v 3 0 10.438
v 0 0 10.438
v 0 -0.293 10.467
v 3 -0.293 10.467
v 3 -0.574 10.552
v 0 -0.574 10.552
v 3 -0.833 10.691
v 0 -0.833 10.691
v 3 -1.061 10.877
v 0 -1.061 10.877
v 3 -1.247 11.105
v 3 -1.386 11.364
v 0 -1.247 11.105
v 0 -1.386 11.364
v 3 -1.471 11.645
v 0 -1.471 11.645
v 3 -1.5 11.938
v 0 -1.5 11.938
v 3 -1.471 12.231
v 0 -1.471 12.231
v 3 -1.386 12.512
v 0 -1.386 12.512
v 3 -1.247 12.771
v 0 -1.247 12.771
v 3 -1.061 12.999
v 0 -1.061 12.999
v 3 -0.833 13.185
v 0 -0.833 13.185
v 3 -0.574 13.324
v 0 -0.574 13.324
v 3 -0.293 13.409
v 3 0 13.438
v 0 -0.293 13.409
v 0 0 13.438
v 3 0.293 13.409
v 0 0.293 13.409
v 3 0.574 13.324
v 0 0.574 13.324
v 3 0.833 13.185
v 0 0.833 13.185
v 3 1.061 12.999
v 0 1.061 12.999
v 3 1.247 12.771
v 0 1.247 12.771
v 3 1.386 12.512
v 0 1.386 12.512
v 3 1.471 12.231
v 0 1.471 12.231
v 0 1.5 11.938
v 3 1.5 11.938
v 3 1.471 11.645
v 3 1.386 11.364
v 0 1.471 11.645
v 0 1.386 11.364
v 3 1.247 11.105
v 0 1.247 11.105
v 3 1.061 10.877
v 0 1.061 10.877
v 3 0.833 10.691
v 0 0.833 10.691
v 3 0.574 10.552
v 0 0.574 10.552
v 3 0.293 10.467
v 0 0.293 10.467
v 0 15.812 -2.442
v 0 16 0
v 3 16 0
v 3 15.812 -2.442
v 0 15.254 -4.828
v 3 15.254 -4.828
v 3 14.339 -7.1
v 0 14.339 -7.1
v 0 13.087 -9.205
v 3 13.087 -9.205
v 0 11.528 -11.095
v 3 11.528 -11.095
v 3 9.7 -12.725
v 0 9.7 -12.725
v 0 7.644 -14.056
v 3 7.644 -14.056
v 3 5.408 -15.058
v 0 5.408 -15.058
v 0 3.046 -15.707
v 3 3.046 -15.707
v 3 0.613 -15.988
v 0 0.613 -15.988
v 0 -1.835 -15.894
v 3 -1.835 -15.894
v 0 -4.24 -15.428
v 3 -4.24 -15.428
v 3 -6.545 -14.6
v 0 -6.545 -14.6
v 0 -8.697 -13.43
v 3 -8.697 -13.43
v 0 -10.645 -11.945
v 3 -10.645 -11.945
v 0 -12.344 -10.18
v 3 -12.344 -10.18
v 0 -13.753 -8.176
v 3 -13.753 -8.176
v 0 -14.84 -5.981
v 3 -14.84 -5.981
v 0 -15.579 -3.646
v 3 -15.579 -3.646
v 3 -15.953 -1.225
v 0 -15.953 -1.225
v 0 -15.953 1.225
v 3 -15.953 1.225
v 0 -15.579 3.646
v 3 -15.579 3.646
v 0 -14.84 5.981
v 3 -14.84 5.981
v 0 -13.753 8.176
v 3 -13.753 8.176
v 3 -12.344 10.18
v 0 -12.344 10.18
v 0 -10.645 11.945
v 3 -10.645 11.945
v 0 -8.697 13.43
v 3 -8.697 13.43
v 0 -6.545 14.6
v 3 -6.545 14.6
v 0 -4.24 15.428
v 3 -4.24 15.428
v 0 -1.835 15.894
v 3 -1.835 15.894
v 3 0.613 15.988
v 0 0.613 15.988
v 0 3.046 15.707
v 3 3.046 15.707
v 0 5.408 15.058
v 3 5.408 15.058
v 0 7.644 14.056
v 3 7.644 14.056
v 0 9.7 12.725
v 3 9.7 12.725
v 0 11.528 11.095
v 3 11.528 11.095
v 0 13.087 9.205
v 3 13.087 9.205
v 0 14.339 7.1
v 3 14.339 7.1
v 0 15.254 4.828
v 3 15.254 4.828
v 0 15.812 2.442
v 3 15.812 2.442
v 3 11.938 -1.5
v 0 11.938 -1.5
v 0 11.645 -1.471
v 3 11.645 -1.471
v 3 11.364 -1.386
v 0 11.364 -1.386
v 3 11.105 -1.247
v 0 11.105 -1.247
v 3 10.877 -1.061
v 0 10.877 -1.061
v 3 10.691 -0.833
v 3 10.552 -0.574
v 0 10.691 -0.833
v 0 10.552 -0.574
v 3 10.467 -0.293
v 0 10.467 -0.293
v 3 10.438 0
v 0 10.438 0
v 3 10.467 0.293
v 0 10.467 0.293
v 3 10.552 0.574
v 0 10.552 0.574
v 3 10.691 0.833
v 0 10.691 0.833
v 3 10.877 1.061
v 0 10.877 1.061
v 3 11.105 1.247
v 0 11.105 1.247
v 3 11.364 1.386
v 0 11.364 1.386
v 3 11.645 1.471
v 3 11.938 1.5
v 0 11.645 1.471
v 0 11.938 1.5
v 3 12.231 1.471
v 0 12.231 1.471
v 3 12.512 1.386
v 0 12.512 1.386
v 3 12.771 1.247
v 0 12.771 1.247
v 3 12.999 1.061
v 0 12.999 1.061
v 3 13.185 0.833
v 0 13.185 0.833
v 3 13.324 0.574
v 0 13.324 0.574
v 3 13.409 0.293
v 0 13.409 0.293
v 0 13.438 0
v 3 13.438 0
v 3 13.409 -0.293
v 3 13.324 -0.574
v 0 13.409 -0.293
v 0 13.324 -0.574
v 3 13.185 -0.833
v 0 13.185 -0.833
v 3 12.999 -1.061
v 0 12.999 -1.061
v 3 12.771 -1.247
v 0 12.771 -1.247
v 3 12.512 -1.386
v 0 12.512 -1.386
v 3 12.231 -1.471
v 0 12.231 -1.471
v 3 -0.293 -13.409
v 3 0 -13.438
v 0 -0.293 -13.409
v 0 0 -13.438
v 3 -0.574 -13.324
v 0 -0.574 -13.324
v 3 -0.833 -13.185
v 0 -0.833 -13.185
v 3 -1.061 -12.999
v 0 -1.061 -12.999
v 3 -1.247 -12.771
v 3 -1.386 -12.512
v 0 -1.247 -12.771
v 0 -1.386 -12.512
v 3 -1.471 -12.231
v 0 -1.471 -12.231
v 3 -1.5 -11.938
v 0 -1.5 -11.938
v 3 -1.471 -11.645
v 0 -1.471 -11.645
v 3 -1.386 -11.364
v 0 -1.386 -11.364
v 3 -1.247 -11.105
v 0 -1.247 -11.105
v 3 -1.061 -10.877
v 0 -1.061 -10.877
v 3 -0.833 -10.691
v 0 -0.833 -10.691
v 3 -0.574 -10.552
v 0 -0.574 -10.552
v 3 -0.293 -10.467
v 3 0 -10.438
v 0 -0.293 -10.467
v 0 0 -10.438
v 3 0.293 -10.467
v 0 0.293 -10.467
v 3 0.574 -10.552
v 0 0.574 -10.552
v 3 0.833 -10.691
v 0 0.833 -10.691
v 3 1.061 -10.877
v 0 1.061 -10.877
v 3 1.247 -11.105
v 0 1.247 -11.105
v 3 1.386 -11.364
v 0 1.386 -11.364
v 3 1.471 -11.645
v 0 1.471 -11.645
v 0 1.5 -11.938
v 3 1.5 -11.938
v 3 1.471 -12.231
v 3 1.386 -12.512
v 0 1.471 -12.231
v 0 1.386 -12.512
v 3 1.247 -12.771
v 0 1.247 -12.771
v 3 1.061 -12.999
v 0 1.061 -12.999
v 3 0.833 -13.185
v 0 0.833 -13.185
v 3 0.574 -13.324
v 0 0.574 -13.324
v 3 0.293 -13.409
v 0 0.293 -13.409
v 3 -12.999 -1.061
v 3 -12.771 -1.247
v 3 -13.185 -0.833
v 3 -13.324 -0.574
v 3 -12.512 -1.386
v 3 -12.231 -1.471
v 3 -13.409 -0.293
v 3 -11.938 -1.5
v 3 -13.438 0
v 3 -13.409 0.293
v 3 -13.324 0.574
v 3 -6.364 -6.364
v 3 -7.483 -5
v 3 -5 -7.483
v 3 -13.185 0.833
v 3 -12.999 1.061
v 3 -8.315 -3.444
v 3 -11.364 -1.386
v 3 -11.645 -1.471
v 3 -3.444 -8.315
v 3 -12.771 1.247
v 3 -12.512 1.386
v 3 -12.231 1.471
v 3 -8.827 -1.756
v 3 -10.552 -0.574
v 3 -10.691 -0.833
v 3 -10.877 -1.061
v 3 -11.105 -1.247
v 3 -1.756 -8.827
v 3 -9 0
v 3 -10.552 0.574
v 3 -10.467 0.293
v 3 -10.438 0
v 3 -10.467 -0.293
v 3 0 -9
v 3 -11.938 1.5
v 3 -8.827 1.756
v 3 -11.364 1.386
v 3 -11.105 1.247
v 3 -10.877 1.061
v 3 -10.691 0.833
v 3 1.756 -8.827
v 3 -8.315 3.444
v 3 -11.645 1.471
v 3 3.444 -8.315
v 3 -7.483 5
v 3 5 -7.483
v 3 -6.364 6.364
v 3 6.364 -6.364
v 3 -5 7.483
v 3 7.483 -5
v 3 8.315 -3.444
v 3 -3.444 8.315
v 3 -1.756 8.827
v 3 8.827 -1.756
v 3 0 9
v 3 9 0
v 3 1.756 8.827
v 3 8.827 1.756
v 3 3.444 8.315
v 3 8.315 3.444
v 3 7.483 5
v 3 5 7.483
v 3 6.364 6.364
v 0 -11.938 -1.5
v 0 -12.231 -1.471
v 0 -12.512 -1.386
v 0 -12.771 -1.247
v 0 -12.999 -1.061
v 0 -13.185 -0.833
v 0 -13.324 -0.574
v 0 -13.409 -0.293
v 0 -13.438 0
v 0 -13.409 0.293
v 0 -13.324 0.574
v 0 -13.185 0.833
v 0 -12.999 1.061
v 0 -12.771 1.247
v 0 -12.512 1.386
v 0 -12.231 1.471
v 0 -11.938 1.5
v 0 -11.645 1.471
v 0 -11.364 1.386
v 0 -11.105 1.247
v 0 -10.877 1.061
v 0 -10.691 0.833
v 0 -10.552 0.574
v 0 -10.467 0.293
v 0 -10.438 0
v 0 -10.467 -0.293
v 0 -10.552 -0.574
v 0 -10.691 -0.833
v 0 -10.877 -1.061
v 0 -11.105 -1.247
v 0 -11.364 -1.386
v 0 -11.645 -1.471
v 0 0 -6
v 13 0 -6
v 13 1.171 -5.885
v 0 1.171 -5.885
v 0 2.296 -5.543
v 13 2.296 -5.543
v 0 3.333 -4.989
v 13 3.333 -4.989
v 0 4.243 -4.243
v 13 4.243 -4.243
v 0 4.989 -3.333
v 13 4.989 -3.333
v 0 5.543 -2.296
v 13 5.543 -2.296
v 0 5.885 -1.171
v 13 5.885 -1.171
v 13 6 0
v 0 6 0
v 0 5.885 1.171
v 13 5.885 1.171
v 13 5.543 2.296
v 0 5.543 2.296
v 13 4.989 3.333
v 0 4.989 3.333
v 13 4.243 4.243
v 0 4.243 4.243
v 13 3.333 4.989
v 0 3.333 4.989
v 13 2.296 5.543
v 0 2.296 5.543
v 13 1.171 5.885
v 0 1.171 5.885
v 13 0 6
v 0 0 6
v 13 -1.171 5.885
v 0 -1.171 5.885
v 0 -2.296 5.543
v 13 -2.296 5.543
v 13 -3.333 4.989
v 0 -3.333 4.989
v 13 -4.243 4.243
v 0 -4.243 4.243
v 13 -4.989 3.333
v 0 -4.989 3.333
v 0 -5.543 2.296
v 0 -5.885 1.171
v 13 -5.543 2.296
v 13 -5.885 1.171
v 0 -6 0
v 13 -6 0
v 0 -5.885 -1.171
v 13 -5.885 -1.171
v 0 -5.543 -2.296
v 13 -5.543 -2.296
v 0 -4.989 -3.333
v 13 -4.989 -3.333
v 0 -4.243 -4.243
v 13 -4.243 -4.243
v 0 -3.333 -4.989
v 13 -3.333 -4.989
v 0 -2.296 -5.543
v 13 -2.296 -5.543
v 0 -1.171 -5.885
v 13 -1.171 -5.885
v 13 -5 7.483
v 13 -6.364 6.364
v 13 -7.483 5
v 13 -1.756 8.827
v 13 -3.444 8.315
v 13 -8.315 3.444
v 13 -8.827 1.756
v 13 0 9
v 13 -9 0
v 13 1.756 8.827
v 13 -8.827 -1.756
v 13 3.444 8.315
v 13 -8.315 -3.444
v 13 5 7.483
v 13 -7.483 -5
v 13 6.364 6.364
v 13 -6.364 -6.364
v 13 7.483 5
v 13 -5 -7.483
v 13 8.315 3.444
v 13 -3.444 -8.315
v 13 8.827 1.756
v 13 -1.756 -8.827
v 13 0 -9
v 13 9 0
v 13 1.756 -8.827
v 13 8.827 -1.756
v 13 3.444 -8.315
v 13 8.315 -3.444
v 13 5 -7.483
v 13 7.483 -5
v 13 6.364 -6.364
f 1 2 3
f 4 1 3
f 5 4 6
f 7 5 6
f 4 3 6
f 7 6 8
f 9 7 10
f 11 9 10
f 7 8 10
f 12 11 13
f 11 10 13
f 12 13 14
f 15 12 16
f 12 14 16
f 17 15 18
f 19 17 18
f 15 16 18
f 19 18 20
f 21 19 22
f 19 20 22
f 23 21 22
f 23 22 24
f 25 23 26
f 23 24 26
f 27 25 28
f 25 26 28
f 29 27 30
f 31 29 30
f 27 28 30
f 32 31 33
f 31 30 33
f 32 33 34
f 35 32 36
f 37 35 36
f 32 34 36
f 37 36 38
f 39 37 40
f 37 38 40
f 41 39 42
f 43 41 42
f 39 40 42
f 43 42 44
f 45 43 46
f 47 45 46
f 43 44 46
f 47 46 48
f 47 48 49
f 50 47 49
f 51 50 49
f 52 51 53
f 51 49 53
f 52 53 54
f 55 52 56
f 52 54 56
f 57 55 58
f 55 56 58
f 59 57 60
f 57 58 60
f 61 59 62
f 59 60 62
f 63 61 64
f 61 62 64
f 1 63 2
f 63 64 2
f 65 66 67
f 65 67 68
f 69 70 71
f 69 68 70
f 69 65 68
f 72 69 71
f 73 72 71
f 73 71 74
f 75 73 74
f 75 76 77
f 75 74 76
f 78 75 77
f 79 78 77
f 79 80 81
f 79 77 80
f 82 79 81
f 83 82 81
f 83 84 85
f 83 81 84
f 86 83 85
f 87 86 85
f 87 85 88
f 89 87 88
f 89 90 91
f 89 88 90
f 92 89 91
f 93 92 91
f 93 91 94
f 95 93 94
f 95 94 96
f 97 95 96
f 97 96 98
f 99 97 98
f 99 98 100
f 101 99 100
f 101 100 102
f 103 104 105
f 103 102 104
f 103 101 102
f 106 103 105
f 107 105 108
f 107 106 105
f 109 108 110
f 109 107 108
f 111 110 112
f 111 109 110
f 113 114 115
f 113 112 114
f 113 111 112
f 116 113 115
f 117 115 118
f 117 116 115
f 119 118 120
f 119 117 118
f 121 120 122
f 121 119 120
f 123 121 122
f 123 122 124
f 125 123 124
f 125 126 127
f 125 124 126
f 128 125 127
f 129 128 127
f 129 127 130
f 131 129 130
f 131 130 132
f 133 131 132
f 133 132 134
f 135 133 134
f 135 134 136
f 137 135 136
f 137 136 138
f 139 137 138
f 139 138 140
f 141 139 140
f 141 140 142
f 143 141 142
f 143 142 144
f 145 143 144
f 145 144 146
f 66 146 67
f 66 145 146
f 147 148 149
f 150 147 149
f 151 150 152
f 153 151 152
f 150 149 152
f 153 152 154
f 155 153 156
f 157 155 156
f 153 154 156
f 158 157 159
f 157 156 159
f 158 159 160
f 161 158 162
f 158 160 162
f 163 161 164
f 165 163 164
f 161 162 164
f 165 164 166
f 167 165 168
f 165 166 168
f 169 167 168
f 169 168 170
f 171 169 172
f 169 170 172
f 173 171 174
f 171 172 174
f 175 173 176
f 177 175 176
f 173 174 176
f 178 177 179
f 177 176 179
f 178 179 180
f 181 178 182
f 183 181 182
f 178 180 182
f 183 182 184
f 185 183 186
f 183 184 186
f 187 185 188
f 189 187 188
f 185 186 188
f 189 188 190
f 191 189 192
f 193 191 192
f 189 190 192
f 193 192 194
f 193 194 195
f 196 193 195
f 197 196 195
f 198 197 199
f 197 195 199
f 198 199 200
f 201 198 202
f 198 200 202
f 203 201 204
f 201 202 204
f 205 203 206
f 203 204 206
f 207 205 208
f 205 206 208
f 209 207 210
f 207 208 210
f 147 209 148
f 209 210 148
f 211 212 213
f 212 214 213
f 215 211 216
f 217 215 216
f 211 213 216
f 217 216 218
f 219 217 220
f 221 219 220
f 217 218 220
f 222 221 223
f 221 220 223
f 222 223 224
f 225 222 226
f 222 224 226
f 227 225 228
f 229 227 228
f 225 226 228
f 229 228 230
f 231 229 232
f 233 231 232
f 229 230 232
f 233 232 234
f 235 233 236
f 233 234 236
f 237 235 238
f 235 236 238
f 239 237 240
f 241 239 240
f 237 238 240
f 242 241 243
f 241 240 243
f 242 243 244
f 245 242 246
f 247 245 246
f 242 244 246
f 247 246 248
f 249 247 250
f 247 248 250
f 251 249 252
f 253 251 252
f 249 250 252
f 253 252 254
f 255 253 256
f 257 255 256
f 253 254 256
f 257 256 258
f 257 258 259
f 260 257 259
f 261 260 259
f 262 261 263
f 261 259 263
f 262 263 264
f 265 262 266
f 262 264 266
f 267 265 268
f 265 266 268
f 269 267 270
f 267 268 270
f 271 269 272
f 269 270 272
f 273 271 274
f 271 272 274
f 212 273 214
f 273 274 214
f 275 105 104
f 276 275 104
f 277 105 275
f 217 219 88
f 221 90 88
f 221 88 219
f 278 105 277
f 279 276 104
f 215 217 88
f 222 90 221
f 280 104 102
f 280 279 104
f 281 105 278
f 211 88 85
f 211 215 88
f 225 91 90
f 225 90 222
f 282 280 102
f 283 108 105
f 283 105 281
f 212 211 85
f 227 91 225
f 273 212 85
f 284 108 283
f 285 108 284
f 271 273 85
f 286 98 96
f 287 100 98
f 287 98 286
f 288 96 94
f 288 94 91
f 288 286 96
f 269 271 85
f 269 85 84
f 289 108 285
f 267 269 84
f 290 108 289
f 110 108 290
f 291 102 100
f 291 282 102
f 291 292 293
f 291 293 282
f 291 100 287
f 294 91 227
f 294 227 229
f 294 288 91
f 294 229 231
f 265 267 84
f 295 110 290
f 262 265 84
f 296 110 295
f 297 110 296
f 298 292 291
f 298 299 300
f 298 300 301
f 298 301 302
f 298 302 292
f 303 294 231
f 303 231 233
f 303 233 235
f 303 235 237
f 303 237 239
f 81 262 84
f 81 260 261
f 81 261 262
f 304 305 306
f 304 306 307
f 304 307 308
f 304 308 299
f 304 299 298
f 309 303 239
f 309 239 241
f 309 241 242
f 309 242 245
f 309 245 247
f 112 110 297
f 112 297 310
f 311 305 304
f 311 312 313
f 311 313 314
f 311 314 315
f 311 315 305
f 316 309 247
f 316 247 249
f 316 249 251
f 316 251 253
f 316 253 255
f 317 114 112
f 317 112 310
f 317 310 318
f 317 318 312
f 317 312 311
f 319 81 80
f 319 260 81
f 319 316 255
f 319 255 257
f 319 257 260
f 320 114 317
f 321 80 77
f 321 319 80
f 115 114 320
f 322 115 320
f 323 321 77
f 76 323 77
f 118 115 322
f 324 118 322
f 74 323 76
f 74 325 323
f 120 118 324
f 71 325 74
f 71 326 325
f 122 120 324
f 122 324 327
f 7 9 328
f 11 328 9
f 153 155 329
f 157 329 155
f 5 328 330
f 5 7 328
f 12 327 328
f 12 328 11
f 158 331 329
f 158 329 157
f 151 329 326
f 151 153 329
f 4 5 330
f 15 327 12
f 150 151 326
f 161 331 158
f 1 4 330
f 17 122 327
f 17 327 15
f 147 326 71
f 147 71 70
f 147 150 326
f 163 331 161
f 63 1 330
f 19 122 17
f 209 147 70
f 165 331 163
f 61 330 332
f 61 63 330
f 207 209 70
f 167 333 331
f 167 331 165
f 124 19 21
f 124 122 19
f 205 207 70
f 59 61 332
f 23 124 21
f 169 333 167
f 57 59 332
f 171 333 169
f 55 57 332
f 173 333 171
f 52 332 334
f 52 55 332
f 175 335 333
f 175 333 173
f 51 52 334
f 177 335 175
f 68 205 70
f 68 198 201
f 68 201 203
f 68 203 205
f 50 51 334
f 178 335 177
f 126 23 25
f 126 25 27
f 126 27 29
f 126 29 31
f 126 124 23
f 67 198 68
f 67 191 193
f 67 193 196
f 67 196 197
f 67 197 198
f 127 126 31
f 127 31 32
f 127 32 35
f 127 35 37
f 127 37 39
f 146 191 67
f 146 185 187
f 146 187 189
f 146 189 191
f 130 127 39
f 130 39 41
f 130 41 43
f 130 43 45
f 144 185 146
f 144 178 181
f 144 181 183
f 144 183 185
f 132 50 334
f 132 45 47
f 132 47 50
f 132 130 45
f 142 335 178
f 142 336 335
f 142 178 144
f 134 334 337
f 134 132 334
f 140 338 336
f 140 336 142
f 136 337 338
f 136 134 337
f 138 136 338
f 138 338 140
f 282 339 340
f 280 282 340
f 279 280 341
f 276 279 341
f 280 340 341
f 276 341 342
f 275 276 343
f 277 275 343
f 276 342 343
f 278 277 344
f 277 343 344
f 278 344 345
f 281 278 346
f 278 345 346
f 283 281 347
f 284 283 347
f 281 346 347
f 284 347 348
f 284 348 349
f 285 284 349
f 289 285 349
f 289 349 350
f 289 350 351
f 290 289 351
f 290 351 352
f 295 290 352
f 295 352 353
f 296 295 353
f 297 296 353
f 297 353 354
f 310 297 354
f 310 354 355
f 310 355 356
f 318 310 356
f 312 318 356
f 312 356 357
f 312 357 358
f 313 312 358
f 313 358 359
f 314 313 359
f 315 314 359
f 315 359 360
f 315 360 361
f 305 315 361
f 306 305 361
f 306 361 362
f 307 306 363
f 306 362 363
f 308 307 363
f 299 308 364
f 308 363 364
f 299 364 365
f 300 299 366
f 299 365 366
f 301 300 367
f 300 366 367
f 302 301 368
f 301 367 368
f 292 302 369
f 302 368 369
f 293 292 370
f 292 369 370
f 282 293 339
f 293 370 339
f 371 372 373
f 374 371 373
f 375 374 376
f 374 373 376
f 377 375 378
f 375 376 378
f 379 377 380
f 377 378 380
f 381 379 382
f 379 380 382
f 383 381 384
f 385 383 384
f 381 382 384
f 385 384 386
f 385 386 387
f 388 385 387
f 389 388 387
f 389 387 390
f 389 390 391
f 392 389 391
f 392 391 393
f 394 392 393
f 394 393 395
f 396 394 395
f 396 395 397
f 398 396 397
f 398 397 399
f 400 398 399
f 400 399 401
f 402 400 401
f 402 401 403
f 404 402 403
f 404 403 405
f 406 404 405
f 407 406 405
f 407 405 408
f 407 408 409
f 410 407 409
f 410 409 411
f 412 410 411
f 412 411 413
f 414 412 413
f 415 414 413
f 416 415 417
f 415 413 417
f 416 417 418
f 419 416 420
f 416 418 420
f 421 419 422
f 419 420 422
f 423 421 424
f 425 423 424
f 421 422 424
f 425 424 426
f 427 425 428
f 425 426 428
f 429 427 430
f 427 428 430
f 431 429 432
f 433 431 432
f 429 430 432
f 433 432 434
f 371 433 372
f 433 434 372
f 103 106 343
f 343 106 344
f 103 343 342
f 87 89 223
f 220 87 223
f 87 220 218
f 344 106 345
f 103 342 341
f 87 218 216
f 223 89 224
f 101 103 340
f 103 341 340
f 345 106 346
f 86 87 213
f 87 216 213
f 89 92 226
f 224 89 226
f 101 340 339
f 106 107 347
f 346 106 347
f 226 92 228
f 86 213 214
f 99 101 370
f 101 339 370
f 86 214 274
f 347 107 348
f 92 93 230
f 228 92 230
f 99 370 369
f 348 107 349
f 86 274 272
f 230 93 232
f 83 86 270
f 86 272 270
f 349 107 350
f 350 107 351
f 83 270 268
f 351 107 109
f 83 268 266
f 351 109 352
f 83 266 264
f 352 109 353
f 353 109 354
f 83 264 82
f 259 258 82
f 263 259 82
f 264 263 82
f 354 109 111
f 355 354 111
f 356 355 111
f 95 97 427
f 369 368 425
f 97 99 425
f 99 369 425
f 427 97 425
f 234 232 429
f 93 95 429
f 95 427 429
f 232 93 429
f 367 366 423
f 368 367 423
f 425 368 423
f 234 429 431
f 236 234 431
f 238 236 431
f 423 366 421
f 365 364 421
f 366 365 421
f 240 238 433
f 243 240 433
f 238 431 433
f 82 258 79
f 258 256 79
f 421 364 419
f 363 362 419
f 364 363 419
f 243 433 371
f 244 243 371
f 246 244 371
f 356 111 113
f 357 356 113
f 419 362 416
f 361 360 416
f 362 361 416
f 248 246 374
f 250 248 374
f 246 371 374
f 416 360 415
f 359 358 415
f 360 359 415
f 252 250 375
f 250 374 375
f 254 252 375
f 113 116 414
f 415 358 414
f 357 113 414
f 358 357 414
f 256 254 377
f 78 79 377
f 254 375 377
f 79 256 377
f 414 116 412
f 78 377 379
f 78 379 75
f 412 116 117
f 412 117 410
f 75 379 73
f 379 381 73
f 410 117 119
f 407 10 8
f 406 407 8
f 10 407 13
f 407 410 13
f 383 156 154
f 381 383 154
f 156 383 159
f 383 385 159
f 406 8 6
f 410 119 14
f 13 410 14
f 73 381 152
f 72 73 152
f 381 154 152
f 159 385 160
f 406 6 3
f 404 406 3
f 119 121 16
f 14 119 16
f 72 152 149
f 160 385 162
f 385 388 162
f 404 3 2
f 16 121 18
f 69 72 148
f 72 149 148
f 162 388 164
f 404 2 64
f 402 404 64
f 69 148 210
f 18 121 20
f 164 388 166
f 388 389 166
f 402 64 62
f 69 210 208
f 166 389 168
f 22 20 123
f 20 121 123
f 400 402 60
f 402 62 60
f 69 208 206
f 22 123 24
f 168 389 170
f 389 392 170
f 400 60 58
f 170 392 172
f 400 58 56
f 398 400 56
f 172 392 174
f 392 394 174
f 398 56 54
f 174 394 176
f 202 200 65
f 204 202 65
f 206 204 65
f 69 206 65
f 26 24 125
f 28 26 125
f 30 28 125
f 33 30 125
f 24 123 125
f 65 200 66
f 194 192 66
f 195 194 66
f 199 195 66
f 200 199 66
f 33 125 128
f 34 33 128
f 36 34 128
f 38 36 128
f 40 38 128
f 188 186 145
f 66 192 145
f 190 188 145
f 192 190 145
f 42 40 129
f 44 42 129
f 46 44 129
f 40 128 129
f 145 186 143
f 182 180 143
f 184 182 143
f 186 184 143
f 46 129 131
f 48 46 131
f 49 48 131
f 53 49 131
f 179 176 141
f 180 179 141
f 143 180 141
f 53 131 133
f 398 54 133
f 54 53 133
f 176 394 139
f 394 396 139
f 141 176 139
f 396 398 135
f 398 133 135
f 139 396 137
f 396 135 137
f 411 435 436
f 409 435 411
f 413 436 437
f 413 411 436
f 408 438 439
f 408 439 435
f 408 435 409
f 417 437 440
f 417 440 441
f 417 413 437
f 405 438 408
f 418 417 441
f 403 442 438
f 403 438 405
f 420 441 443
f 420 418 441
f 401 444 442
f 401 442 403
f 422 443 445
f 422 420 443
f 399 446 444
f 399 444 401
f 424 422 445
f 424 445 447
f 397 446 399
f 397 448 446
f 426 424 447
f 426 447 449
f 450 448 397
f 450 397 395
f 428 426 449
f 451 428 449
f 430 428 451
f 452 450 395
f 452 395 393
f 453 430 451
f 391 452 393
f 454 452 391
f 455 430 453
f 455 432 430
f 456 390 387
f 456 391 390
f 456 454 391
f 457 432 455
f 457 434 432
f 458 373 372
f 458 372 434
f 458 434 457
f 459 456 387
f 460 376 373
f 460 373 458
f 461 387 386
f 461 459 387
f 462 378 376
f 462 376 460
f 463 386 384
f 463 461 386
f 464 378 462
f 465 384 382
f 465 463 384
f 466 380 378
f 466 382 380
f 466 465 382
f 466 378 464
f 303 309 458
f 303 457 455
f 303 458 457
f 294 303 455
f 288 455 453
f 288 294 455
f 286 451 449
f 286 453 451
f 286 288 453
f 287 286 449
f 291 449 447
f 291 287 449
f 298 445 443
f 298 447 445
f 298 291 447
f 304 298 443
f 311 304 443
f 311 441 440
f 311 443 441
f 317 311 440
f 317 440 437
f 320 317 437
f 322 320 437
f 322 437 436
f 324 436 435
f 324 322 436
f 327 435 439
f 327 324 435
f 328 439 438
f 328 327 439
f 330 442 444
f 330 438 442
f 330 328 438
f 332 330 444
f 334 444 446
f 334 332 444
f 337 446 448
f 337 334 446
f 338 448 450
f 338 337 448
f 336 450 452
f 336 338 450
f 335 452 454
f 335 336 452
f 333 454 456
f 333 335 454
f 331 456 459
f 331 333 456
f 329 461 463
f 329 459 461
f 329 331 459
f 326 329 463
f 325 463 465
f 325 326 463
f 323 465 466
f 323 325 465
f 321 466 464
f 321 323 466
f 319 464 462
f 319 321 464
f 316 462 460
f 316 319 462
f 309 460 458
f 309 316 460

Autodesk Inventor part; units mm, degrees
ref_plane "YZ Plane" through (0, 0, 0) normal (1, 0, 0) x (0, 1, 0)
ref_plane "XZ Plane" through (0, 0, 0) normal (0, 1, 0) x (-1, 0, 0)
ref_plane "XY Plane" through (0, 0, 0) normal (0, 0, 1) x (1, 0, 0)
sketch "Sketch1" plane through (0, 0, 0) normal (1, 0, 0) x (0, 1, 0)
  circle A0 centre (0, 0) radius 16
  dimension "d0" = 32
extrude "Extrusion1" add sketch "Sketch1" along normal blind 3
sketch "Sketch2" plane through (3, 0, 0) normal (1, 0, 0) x (0, 0, -1)
  circle A0 centre (0, 0) radius 9
  dimension "d3" = 18
extrude "Extrusion2" add sketch "Sketch2" along normal blind 10
sketch "Sketch3" plane through (13, 0, 0) normal (1, 0, 0) x (0, 0, -1)
  circle A0 centre (0, 0) radius 6
  dimension "d6" = 12
extrude "Extrusion3" cut sketch "Sketch3" against normal through all
sketch "Sketch4" plane through (3, 0, 0) normal (1, 0, 0) x (0, 0, -1)
  circle A0 centre (0, 0) radius 9 projected
  circle A1 centre (0, 0) radius 16 projected
  point P0 (0, 11.938)
  point P1 (-11.938, 0)
  point P2 (0, -11.938)
  point P3 (11.938, 0)
  dimension "d9" = 11.938
  dimension "d10" = 32
  dimension "d11" = 18
  dimension "d14" = 360
hole "Hole1" at (3, 11.938, 0) at (3, 0, 11.938) at (3, -11.938, 0) at (3, 0, -11.938) direction (-1, 0, 0) diameter 3 end through all
properties part number "Flange"
